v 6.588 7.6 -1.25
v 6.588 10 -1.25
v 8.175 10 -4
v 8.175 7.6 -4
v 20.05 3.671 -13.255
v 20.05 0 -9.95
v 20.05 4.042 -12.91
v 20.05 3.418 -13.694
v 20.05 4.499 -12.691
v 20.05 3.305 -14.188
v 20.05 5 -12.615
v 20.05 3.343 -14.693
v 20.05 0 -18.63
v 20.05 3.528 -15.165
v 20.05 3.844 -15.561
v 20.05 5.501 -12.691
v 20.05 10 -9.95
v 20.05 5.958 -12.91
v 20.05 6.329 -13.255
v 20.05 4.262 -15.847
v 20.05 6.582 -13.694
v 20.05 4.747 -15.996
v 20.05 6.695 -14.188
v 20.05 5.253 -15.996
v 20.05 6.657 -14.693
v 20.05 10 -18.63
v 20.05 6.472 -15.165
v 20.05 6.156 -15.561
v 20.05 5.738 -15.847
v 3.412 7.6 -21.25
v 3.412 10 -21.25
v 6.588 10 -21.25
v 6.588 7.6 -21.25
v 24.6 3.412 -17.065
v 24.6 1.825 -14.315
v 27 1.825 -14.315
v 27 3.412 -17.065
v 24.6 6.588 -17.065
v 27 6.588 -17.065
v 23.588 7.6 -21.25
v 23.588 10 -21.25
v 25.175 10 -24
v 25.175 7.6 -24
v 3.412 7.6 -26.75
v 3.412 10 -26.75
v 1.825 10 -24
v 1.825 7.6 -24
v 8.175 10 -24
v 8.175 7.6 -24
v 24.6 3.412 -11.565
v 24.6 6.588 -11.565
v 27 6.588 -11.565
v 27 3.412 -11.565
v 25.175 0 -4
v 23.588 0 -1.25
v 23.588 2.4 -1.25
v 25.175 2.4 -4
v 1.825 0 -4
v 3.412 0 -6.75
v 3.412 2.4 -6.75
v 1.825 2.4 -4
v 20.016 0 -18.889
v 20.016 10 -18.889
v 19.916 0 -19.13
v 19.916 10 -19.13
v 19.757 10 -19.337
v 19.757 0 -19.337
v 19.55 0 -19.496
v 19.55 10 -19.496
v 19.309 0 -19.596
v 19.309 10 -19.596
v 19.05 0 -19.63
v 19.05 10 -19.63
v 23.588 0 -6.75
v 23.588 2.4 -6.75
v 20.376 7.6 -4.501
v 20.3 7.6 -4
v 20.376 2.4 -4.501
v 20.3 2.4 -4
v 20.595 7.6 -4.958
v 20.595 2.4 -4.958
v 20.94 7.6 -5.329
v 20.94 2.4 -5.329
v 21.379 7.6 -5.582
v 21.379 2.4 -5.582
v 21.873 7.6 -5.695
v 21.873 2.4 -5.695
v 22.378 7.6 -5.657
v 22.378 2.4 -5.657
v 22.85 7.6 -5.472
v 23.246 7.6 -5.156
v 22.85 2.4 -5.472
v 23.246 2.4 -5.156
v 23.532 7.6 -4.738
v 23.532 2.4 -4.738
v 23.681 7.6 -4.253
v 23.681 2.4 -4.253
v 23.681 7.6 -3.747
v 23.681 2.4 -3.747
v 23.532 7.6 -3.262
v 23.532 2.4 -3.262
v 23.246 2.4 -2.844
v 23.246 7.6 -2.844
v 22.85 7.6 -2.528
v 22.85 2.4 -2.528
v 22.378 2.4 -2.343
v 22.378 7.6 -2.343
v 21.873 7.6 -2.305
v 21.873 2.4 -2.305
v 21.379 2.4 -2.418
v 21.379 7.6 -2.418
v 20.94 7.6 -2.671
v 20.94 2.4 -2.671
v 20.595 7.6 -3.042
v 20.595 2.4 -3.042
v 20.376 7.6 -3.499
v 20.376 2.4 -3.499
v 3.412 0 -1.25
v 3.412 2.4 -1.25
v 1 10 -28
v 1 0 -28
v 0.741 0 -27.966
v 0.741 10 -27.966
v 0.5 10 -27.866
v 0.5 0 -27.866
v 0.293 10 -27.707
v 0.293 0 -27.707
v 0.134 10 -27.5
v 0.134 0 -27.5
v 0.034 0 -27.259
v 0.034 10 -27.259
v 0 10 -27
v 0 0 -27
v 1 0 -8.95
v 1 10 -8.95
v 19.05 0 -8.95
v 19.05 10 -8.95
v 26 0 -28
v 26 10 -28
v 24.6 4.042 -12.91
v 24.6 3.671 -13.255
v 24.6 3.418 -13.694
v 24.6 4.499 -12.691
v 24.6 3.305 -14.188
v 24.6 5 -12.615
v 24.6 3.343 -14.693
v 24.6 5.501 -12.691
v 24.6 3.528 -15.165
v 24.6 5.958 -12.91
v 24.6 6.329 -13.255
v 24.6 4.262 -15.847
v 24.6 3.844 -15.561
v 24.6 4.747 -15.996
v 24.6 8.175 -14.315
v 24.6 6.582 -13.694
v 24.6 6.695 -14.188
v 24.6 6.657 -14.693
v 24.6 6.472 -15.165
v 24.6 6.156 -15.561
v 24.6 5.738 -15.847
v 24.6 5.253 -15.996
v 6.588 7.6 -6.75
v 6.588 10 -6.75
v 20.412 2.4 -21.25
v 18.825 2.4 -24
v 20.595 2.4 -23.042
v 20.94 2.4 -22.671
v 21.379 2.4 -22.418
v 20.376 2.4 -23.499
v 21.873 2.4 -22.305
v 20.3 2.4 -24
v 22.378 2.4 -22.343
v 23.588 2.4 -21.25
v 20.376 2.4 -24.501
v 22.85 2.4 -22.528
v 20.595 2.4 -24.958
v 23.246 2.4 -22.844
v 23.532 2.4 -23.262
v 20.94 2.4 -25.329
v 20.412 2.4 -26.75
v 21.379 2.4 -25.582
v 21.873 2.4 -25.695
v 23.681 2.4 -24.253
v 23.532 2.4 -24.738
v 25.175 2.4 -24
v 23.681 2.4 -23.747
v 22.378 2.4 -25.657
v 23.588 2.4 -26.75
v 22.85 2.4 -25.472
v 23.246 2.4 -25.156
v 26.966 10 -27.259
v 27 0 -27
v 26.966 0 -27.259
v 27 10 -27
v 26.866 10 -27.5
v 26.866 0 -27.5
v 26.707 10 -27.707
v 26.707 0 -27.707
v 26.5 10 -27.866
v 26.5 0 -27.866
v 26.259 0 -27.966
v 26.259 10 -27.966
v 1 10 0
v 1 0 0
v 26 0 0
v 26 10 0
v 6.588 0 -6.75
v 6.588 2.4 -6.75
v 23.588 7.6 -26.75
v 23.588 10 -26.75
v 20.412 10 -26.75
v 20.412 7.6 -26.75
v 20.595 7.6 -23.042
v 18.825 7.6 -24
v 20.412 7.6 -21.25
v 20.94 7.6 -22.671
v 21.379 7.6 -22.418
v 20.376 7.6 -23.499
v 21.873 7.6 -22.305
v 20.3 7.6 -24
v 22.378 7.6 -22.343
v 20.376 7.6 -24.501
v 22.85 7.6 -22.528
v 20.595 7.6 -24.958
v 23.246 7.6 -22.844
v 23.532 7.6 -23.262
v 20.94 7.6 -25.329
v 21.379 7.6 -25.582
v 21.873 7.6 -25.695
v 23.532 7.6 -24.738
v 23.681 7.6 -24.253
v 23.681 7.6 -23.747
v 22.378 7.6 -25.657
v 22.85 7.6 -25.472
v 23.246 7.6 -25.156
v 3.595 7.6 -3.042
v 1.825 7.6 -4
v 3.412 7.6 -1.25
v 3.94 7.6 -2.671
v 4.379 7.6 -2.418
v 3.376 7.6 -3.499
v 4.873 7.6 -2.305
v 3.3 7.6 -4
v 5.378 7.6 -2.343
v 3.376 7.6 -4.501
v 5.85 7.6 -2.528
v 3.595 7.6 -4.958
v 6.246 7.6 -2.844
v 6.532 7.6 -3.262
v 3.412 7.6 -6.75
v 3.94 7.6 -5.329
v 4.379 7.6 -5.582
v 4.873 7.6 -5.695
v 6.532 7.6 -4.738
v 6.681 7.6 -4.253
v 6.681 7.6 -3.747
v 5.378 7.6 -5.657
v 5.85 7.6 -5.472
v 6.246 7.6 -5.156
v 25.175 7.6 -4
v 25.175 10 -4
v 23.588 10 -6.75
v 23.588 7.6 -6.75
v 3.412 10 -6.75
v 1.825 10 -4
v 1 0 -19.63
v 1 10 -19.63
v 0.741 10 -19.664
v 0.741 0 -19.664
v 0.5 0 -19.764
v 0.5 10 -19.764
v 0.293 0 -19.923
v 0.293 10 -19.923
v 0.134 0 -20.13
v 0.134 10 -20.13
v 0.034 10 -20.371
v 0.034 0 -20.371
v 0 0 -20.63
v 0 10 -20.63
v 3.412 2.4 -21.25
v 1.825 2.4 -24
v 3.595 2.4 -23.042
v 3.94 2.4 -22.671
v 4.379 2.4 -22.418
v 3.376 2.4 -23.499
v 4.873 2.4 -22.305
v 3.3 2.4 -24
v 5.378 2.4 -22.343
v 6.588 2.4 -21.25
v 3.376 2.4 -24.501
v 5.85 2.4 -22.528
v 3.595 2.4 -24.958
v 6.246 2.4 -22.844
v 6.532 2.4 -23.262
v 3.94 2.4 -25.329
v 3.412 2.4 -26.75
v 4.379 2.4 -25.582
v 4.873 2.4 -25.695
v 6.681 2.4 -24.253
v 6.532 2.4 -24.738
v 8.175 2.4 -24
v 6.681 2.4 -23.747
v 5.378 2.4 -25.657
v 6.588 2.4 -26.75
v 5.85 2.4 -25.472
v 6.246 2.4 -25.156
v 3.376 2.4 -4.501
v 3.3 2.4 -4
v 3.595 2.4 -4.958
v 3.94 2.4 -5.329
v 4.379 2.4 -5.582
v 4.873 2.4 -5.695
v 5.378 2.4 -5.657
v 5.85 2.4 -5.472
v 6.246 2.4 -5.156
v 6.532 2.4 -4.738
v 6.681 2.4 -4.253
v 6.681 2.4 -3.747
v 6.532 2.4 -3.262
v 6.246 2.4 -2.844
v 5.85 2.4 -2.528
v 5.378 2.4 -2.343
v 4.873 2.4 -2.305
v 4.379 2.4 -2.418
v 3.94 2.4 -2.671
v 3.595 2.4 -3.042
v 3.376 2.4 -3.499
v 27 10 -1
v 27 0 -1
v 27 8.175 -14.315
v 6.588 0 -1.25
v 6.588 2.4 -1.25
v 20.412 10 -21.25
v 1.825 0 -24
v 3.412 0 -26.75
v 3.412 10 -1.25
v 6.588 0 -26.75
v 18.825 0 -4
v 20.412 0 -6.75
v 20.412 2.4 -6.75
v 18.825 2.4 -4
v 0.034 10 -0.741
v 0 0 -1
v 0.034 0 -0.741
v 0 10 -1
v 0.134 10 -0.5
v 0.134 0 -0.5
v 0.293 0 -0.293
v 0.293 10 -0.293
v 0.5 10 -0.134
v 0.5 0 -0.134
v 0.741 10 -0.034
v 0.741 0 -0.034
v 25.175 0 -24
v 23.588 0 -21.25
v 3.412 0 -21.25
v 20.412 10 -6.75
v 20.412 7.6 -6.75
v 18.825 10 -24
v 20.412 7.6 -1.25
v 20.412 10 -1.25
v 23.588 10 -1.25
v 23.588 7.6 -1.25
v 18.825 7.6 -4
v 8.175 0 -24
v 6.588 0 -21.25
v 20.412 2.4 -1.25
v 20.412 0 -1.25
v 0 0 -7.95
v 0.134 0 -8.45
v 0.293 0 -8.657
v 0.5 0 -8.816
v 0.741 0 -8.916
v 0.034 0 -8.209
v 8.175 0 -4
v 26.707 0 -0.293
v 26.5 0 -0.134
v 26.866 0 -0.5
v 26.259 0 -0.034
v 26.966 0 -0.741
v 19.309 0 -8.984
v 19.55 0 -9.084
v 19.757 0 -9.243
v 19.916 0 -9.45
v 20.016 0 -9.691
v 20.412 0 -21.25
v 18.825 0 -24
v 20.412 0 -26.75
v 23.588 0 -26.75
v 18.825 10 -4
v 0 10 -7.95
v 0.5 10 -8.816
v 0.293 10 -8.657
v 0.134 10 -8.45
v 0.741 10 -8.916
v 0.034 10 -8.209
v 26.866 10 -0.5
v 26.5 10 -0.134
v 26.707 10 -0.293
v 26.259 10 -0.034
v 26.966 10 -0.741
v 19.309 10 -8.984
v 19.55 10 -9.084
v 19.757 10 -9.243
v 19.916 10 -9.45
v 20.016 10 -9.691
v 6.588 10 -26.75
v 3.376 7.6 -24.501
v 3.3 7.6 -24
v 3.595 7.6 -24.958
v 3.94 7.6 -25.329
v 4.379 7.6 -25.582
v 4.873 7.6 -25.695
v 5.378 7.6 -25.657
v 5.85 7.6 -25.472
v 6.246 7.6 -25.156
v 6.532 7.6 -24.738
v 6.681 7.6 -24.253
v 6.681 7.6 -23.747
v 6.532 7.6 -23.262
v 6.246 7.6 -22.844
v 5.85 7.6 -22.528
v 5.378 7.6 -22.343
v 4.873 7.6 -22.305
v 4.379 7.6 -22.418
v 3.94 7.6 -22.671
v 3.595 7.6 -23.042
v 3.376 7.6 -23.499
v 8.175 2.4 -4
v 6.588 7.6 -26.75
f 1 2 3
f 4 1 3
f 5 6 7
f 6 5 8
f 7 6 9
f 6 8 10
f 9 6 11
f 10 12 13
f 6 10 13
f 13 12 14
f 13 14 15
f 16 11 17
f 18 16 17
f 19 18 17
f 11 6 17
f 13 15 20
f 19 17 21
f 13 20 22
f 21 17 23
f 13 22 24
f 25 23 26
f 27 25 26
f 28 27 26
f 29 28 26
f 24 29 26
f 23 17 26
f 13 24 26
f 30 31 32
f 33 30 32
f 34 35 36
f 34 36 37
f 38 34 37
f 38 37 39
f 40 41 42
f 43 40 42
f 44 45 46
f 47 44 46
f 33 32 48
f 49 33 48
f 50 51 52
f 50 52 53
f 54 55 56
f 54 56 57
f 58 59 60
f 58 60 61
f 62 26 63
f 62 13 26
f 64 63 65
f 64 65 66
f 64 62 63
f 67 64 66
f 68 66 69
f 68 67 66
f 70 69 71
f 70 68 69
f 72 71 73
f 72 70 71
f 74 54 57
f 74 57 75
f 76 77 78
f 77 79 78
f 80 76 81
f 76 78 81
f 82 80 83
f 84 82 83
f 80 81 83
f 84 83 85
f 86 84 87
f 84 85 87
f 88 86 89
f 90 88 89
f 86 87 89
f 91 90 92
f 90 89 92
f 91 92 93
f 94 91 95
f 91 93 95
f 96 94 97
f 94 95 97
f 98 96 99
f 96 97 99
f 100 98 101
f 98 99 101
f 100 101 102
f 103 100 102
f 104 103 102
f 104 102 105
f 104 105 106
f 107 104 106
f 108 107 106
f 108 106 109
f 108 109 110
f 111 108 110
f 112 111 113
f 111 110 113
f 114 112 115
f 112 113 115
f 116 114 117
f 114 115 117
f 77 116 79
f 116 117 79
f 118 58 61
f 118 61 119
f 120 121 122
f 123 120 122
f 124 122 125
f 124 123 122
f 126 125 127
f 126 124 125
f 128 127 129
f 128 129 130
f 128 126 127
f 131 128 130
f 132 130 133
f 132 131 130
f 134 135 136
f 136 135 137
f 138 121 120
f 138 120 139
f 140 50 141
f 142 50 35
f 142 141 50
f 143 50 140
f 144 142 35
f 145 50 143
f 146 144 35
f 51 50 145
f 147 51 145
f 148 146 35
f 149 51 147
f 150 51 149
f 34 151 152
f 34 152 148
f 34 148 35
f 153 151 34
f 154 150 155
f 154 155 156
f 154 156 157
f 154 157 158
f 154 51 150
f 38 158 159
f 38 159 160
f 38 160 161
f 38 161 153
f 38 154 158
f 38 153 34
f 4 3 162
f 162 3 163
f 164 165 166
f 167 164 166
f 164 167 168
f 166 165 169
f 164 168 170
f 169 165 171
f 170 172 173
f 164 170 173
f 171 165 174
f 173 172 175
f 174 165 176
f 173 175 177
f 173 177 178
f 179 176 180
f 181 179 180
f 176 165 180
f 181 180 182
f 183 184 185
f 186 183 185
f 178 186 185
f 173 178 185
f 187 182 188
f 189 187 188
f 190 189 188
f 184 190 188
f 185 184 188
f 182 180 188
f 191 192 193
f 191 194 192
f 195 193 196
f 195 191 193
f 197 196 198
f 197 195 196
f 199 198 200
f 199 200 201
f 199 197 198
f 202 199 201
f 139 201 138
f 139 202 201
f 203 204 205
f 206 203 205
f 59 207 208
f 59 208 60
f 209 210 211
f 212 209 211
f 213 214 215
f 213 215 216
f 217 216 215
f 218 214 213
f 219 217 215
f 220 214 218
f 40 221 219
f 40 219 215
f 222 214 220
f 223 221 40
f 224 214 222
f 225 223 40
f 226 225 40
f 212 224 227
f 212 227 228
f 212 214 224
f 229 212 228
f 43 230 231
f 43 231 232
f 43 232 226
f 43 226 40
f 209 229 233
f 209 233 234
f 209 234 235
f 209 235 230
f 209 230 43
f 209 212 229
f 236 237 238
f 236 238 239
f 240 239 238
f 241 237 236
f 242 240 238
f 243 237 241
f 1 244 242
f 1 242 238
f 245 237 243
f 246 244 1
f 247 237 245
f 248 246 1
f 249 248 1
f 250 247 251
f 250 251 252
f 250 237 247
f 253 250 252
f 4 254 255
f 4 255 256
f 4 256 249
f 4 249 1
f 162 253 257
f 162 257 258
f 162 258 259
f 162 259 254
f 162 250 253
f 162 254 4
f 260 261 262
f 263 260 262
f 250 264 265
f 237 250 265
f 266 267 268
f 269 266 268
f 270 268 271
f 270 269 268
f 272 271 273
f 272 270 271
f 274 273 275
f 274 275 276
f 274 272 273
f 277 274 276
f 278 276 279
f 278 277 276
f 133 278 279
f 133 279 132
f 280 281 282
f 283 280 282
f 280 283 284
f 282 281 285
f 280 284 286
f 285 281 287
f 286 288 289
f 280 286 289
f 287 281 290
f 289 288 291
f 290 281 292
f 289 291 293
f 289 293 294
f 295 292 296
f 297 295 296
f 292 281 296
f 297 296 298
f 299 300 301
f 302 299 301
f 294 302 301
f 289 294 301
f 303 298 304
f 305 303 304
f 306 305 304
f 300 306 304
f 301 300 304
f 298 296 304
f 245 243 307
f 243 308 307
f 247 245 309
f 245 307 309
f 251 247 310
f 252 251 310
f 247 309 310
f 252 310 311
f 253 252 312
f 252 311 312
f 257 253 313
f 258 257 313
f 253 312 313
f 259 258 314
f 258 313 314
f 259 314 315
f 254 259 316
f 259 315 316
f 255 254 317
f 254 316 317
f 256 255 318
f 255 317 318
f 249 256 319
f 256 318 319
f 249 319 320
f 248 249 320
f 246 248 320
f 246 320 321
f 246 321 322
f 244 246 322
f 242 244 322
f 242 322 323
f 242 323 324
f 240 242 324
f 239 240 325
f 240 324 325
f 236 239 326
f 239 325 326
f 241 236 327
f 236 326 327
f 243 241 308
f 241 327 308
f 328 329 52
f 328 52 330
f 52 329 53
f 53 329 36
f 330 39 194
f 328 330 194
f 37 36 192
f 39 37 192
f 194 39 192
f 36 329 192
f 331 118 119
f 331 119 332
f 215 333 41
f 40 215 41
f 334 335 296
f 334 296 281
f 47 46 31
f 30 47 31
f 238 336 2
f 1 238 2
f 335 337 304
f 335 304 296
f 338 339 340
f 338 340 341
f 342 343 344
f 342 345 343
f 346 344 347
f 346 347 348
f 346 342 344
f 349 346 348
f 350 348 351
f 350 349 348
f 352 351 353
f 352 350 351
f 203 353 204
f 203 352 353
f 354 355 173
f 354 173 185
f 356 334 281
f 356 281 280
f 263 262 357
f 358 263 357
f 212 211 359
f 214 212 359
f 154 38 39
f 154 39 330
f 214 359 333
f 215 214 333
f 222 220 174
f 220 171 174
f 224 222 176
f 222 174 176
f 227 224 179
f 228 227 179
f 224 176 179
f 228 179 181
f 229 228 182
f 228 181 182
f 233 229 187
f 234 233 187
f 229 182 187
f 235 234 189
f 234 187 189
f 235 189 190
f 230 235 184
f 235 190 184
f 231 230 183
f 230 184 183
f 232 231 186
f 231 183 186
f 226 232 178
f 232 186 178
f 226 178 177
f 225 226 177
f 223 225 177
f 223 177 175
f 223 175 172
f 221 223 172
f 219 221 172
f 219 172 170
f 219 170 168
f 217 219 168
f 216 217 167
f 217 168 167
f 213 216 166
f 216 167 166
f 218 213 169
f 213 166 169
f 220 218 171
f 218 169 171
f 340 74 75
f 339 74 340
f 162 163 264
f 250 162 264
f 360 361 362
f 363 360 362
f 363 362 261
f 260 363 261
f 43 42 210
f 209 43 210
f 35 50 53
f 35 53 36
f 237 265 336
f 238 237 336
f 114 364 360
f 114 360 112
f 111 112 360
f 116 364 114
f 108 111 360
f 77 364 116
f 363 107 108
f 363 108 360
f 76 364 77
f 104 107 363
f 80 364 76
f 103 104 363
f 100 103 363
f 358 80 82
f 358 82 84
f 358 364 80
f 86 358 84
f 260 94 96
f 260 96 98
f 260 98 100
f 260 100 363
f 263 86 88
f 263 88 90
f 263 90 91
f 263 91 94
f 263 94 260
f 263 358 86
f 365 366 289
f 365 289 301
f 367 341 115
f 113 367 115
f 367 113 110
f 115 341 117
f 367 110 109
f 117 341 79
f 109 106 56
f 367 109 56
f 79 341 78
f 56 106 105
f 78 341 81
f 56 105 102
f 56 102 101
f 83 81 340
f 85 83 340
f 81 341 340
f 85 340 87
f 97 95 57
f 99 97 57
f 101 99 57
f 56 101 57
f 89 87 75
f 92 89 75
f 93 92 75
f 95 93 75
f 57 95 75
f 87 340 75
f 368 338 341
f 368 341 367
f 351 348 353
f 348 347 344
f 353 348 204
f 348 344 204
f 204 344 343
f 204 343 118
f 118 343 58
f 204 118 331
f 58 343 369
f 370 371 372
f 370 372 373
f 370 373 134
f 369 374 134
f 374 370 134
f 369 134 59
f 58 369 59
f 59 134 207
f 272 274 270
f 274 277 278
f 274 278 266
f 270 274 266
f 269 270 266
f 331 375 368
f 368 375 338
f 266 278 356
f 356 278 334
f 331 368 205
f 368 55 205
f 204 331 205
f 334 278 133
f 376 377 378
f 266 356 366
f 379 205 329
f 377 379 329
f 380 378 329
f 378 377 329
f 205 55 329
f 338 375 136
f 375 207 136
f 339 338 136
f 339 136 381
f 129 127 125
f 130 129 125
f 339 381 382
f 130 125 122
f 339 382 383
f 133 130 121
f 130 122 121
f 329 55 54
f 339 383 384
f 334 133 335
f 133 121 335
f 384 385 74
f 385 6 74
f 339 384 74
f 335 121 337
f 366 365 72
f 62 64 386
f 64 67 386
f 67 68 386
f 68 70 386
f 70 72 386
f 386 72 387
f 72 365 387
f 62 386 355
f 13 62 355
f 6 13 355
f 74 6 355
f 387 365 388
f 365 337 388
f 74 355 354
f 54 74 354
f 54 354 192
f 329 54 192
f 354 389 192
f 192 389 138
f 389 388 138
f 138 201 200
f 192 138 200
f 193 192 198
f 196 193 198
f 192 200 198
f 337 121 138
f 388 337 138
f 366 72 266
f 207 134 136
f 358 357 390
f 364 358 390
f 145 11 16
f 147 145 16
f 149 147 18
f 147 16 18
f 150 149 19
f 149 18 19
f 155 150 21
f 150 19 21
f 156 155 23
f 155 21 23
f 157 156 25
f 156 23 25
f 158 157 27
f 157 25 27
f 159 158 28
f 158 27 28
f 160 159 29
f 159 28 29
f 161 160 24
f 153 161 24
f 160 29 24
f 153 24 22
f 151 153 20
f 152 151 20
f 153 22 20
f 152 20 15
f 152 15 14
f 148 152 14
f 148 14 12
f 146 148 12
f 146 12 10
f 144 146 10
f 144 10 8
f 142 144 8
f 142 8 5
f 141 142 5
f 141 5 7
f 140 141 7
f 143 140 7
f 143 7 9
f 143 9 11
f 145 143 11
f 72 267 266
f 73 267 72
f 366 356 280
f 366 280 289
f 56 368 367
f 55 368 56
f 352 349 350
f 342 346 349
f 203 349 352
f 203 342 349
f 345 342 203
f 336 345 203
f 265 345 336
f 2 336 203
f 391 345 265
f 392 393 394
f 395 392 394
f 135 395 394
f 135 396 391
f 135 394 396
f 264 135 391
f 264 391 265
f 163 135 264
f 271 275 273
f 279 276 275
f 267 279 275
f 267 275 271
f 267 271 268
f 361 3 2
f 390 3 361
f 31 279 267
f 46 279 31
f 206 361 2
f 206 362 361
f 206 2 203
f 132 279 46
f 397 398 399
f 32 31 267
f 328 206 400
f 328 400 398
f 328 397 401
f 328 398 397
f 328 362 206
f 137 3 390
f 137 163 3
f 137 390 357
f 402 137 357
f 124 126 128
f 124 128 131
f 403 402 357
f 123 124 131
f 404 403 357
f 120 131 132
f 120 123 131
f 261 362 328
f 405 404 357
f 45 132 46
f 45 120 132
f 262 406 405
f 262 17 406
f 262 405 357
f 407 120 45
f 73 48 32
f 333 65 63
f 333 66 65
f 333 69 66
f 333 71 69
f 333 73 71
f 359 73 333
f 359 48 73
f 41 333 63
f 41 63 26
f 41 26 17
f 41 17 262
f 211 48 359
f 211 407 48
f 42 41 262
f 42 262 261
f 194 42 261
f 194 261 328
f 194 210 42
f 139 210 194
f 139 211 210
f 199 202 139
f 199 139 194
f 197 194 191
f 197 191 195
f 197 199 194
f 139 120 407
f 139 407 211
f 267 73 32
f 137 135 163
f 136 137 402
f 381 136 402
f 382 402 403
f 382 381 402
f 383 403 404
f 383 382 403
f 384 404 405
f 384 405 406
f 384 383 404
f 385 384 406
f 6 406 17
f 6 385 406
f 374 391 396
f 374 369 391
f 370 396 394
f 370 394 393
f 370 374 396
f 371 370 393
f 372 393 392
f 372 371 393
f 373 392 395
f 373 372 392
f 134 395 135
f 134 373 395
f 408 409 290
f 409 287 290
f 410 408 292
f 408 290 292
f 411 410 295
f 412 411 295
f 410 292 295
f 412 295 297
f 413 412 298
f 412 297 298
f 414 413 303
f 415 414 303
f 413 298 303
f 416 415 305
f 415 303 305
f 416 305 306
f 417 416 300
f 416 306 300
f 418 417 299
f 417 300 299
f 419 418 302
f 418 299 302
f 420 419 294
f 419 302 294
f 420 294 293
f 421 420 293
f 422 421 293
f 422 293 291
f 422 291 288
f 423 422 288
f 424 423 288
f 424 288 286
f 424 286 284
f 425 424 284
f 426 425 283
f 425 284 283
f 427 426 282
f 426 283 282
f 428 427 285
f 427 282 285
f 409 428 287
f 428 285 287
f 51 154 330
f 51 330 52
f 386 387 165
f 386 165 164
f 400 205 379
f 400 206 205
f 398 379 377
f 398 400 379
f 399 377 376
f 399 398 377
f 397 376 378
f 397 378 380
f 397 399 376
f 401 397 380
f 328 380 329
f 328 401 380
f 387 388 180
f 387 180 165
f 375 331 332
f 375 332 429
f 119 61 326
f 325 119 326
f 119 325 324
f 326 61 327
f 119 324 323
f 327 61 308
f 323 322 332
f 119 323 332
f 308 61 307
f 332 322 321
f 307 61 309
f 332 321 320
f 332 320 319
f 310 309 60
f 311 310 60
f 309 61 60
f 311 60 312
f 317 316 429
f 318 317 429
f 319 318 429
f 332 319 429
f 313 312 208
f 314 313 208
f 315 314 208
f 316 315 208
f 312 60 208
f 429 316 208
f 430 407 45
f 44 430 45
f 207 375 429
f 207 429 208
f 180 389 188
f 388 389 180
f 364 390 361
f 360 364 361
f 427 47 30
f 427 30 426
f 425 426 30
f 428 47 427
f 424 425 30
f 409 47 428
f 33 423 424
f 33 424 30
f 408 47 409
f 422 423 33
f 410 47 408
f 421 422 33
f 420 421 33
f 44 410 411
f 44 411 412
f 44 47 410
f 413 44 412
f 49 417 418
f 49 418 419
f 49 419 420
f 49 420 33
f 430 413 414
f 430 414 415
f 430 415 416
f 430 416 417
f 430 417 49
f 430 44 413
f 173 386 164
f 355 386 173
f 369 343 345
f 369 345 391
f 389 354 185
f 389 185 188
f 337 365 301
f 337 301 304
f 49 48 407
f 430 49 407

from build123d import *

# Parameters (mm, degrees)
SKETCH1_W            = 27
SKETCH1_H            = 28
BOSS_EXTRUDE1_DEPTH  = 10
SKETCH2_W            = 20.05
SKETCH2_H            = 10.68
CUT_EXTRUDE1_DEPTH   = 11
M3_CLEARANCE_HOLE1_D = 3.4
M3_CLEARANCE_HOLE2_D = 3.4
CUT_EXTRUDE2_DEPTH   = 2.4
FILLET1_R            = 1
CUT_EXTRUDE8_START   = -2.4
CUT_EXTRUDE8_DEPTH   = 2.4


with BuildPart() as part:
    # Sketch1 → Boss-Extrude1 (new body)
    with BuildSketch(Plane(origin=(0, 0, 0), x_dir=(1, 0, 0), z_dir=(0, 1, 0))):
        with Locations((13.5, 14)):
            Rectangle(SKETCH1_W, SKETCH1_H)
    extrude(amount=BOSS_EXTRUDE1_DEPTH)

    # Sketch2 → Cut-Extrude1 (cut, through all)
    with BuildSketch(Plane(origin=(0, 10, 0), x_dir=(1, 0, 0), z_dir=(0, 1, 0))):
        with Locations((10.025, 14.29)):
            Rectangle(SKETCH2_W, SKETCH2_H)
    extrude(amount=-CUT_EXTRUDE1_DEPTH, mode=Mode.SUBTRACT)

    # M3 Clearance Hole1 (through all)
    with Locations(Plane(origin=(27, 0, 0), x_dir=(0, 0, -1), z_dir=(1, 0, 0))):
        with Locations((14.315, 4.999999998)):
            Hole(M3_CLEARANCE_HOLE1_D / 2)

    # M3 Clearance Hole2 (through all)
    with Locations(Plane(origin=(0, 10, 0), x_dir=(1, 0, 0), z_dir=(0, 1, 0))):
        with Locations((5, 24), (22, 24), (22, 4), (5, 4)):
            Hole(M3_CLEARANCE_HOLE2_D / 2)

    # Sketch7 → Cut-Extrude2 (cut)
    with BuildSketch(Plane(origin=(0, 10, 0), x_dir=(1, 0, 0), z_dir=(0, 1, 0))):
        Polygon((6.58771324, 1.25), (8.175426481, 4), (6.58771324, 6.75), (3.41228676, 6.75), (1.824573519, 4), (3.41228676, 1.25), align=None)
        Polygon((23.58771324, 1.25), (25.175426481, 4), (23.58771324, 6.75), (20.41228676, 6.75), (18.824573519, 4), (20.41228676, 1.25), align=None)
        Polygon((23.58771324, 21.25), (25.175426481, 24), (23.58771324, 26.75), (20.41228676, 26.75), (18.824573519, 24), (20.41228676, 21.25), align=None)
        Polygon((6.58771324, 21.25), (8.175426481, 24), (6.58771324, 26.75), (3.41228676, 26.75), (1.824573519, 24), (3.41228676, 21.25), align=None)
    cut_extrude2 = extrude(amount=-CUT_EXTRUDE2_DEPTH, mode=Mode.SUBTRACT)

    # Mirror1: Cut-Extrude2 across plane
    add(cut_extrude2.mirror(Plane.ZX.offset(5)), mode=Mode.SUBTRACT)

    # Fillet1
    fillet1_edges = [part.edges().sort_by_distance(p)[0] for p in [
        (0, 5, -8.95),
        (0, 5, -19.63),
        (20.05, 5, -19.63),
        (20.05, 5, -8.95),
        (0, 5, -28),
        (27, 5, -28),
        (27, 5, 0),
        (0, 5, 0),
    ]]
    fillet(fillet1_edges, radius=FILLET1_R)

    # Sketch12 → Cut-Extrude8 (cut)
    with BuildSketch(Plane(origin=(27, 0, 0), x_dir=(0, 0, -1), z_dir=(1, 0, 0)).offset(CUT_EXTRUDE8_START)):
        Polygon((14.315, 1.824573517), (17.065, 3.412286757), (17.065, 6.587713238), (14.315, 8.175426478), (11.565, 6.587713238), (11.565, 3.412286757), align=None)
    extrude(amount=CUT_EXTRUDE8_DEPTH, mode=Mode.SUBTRACT)


solid = part.part
